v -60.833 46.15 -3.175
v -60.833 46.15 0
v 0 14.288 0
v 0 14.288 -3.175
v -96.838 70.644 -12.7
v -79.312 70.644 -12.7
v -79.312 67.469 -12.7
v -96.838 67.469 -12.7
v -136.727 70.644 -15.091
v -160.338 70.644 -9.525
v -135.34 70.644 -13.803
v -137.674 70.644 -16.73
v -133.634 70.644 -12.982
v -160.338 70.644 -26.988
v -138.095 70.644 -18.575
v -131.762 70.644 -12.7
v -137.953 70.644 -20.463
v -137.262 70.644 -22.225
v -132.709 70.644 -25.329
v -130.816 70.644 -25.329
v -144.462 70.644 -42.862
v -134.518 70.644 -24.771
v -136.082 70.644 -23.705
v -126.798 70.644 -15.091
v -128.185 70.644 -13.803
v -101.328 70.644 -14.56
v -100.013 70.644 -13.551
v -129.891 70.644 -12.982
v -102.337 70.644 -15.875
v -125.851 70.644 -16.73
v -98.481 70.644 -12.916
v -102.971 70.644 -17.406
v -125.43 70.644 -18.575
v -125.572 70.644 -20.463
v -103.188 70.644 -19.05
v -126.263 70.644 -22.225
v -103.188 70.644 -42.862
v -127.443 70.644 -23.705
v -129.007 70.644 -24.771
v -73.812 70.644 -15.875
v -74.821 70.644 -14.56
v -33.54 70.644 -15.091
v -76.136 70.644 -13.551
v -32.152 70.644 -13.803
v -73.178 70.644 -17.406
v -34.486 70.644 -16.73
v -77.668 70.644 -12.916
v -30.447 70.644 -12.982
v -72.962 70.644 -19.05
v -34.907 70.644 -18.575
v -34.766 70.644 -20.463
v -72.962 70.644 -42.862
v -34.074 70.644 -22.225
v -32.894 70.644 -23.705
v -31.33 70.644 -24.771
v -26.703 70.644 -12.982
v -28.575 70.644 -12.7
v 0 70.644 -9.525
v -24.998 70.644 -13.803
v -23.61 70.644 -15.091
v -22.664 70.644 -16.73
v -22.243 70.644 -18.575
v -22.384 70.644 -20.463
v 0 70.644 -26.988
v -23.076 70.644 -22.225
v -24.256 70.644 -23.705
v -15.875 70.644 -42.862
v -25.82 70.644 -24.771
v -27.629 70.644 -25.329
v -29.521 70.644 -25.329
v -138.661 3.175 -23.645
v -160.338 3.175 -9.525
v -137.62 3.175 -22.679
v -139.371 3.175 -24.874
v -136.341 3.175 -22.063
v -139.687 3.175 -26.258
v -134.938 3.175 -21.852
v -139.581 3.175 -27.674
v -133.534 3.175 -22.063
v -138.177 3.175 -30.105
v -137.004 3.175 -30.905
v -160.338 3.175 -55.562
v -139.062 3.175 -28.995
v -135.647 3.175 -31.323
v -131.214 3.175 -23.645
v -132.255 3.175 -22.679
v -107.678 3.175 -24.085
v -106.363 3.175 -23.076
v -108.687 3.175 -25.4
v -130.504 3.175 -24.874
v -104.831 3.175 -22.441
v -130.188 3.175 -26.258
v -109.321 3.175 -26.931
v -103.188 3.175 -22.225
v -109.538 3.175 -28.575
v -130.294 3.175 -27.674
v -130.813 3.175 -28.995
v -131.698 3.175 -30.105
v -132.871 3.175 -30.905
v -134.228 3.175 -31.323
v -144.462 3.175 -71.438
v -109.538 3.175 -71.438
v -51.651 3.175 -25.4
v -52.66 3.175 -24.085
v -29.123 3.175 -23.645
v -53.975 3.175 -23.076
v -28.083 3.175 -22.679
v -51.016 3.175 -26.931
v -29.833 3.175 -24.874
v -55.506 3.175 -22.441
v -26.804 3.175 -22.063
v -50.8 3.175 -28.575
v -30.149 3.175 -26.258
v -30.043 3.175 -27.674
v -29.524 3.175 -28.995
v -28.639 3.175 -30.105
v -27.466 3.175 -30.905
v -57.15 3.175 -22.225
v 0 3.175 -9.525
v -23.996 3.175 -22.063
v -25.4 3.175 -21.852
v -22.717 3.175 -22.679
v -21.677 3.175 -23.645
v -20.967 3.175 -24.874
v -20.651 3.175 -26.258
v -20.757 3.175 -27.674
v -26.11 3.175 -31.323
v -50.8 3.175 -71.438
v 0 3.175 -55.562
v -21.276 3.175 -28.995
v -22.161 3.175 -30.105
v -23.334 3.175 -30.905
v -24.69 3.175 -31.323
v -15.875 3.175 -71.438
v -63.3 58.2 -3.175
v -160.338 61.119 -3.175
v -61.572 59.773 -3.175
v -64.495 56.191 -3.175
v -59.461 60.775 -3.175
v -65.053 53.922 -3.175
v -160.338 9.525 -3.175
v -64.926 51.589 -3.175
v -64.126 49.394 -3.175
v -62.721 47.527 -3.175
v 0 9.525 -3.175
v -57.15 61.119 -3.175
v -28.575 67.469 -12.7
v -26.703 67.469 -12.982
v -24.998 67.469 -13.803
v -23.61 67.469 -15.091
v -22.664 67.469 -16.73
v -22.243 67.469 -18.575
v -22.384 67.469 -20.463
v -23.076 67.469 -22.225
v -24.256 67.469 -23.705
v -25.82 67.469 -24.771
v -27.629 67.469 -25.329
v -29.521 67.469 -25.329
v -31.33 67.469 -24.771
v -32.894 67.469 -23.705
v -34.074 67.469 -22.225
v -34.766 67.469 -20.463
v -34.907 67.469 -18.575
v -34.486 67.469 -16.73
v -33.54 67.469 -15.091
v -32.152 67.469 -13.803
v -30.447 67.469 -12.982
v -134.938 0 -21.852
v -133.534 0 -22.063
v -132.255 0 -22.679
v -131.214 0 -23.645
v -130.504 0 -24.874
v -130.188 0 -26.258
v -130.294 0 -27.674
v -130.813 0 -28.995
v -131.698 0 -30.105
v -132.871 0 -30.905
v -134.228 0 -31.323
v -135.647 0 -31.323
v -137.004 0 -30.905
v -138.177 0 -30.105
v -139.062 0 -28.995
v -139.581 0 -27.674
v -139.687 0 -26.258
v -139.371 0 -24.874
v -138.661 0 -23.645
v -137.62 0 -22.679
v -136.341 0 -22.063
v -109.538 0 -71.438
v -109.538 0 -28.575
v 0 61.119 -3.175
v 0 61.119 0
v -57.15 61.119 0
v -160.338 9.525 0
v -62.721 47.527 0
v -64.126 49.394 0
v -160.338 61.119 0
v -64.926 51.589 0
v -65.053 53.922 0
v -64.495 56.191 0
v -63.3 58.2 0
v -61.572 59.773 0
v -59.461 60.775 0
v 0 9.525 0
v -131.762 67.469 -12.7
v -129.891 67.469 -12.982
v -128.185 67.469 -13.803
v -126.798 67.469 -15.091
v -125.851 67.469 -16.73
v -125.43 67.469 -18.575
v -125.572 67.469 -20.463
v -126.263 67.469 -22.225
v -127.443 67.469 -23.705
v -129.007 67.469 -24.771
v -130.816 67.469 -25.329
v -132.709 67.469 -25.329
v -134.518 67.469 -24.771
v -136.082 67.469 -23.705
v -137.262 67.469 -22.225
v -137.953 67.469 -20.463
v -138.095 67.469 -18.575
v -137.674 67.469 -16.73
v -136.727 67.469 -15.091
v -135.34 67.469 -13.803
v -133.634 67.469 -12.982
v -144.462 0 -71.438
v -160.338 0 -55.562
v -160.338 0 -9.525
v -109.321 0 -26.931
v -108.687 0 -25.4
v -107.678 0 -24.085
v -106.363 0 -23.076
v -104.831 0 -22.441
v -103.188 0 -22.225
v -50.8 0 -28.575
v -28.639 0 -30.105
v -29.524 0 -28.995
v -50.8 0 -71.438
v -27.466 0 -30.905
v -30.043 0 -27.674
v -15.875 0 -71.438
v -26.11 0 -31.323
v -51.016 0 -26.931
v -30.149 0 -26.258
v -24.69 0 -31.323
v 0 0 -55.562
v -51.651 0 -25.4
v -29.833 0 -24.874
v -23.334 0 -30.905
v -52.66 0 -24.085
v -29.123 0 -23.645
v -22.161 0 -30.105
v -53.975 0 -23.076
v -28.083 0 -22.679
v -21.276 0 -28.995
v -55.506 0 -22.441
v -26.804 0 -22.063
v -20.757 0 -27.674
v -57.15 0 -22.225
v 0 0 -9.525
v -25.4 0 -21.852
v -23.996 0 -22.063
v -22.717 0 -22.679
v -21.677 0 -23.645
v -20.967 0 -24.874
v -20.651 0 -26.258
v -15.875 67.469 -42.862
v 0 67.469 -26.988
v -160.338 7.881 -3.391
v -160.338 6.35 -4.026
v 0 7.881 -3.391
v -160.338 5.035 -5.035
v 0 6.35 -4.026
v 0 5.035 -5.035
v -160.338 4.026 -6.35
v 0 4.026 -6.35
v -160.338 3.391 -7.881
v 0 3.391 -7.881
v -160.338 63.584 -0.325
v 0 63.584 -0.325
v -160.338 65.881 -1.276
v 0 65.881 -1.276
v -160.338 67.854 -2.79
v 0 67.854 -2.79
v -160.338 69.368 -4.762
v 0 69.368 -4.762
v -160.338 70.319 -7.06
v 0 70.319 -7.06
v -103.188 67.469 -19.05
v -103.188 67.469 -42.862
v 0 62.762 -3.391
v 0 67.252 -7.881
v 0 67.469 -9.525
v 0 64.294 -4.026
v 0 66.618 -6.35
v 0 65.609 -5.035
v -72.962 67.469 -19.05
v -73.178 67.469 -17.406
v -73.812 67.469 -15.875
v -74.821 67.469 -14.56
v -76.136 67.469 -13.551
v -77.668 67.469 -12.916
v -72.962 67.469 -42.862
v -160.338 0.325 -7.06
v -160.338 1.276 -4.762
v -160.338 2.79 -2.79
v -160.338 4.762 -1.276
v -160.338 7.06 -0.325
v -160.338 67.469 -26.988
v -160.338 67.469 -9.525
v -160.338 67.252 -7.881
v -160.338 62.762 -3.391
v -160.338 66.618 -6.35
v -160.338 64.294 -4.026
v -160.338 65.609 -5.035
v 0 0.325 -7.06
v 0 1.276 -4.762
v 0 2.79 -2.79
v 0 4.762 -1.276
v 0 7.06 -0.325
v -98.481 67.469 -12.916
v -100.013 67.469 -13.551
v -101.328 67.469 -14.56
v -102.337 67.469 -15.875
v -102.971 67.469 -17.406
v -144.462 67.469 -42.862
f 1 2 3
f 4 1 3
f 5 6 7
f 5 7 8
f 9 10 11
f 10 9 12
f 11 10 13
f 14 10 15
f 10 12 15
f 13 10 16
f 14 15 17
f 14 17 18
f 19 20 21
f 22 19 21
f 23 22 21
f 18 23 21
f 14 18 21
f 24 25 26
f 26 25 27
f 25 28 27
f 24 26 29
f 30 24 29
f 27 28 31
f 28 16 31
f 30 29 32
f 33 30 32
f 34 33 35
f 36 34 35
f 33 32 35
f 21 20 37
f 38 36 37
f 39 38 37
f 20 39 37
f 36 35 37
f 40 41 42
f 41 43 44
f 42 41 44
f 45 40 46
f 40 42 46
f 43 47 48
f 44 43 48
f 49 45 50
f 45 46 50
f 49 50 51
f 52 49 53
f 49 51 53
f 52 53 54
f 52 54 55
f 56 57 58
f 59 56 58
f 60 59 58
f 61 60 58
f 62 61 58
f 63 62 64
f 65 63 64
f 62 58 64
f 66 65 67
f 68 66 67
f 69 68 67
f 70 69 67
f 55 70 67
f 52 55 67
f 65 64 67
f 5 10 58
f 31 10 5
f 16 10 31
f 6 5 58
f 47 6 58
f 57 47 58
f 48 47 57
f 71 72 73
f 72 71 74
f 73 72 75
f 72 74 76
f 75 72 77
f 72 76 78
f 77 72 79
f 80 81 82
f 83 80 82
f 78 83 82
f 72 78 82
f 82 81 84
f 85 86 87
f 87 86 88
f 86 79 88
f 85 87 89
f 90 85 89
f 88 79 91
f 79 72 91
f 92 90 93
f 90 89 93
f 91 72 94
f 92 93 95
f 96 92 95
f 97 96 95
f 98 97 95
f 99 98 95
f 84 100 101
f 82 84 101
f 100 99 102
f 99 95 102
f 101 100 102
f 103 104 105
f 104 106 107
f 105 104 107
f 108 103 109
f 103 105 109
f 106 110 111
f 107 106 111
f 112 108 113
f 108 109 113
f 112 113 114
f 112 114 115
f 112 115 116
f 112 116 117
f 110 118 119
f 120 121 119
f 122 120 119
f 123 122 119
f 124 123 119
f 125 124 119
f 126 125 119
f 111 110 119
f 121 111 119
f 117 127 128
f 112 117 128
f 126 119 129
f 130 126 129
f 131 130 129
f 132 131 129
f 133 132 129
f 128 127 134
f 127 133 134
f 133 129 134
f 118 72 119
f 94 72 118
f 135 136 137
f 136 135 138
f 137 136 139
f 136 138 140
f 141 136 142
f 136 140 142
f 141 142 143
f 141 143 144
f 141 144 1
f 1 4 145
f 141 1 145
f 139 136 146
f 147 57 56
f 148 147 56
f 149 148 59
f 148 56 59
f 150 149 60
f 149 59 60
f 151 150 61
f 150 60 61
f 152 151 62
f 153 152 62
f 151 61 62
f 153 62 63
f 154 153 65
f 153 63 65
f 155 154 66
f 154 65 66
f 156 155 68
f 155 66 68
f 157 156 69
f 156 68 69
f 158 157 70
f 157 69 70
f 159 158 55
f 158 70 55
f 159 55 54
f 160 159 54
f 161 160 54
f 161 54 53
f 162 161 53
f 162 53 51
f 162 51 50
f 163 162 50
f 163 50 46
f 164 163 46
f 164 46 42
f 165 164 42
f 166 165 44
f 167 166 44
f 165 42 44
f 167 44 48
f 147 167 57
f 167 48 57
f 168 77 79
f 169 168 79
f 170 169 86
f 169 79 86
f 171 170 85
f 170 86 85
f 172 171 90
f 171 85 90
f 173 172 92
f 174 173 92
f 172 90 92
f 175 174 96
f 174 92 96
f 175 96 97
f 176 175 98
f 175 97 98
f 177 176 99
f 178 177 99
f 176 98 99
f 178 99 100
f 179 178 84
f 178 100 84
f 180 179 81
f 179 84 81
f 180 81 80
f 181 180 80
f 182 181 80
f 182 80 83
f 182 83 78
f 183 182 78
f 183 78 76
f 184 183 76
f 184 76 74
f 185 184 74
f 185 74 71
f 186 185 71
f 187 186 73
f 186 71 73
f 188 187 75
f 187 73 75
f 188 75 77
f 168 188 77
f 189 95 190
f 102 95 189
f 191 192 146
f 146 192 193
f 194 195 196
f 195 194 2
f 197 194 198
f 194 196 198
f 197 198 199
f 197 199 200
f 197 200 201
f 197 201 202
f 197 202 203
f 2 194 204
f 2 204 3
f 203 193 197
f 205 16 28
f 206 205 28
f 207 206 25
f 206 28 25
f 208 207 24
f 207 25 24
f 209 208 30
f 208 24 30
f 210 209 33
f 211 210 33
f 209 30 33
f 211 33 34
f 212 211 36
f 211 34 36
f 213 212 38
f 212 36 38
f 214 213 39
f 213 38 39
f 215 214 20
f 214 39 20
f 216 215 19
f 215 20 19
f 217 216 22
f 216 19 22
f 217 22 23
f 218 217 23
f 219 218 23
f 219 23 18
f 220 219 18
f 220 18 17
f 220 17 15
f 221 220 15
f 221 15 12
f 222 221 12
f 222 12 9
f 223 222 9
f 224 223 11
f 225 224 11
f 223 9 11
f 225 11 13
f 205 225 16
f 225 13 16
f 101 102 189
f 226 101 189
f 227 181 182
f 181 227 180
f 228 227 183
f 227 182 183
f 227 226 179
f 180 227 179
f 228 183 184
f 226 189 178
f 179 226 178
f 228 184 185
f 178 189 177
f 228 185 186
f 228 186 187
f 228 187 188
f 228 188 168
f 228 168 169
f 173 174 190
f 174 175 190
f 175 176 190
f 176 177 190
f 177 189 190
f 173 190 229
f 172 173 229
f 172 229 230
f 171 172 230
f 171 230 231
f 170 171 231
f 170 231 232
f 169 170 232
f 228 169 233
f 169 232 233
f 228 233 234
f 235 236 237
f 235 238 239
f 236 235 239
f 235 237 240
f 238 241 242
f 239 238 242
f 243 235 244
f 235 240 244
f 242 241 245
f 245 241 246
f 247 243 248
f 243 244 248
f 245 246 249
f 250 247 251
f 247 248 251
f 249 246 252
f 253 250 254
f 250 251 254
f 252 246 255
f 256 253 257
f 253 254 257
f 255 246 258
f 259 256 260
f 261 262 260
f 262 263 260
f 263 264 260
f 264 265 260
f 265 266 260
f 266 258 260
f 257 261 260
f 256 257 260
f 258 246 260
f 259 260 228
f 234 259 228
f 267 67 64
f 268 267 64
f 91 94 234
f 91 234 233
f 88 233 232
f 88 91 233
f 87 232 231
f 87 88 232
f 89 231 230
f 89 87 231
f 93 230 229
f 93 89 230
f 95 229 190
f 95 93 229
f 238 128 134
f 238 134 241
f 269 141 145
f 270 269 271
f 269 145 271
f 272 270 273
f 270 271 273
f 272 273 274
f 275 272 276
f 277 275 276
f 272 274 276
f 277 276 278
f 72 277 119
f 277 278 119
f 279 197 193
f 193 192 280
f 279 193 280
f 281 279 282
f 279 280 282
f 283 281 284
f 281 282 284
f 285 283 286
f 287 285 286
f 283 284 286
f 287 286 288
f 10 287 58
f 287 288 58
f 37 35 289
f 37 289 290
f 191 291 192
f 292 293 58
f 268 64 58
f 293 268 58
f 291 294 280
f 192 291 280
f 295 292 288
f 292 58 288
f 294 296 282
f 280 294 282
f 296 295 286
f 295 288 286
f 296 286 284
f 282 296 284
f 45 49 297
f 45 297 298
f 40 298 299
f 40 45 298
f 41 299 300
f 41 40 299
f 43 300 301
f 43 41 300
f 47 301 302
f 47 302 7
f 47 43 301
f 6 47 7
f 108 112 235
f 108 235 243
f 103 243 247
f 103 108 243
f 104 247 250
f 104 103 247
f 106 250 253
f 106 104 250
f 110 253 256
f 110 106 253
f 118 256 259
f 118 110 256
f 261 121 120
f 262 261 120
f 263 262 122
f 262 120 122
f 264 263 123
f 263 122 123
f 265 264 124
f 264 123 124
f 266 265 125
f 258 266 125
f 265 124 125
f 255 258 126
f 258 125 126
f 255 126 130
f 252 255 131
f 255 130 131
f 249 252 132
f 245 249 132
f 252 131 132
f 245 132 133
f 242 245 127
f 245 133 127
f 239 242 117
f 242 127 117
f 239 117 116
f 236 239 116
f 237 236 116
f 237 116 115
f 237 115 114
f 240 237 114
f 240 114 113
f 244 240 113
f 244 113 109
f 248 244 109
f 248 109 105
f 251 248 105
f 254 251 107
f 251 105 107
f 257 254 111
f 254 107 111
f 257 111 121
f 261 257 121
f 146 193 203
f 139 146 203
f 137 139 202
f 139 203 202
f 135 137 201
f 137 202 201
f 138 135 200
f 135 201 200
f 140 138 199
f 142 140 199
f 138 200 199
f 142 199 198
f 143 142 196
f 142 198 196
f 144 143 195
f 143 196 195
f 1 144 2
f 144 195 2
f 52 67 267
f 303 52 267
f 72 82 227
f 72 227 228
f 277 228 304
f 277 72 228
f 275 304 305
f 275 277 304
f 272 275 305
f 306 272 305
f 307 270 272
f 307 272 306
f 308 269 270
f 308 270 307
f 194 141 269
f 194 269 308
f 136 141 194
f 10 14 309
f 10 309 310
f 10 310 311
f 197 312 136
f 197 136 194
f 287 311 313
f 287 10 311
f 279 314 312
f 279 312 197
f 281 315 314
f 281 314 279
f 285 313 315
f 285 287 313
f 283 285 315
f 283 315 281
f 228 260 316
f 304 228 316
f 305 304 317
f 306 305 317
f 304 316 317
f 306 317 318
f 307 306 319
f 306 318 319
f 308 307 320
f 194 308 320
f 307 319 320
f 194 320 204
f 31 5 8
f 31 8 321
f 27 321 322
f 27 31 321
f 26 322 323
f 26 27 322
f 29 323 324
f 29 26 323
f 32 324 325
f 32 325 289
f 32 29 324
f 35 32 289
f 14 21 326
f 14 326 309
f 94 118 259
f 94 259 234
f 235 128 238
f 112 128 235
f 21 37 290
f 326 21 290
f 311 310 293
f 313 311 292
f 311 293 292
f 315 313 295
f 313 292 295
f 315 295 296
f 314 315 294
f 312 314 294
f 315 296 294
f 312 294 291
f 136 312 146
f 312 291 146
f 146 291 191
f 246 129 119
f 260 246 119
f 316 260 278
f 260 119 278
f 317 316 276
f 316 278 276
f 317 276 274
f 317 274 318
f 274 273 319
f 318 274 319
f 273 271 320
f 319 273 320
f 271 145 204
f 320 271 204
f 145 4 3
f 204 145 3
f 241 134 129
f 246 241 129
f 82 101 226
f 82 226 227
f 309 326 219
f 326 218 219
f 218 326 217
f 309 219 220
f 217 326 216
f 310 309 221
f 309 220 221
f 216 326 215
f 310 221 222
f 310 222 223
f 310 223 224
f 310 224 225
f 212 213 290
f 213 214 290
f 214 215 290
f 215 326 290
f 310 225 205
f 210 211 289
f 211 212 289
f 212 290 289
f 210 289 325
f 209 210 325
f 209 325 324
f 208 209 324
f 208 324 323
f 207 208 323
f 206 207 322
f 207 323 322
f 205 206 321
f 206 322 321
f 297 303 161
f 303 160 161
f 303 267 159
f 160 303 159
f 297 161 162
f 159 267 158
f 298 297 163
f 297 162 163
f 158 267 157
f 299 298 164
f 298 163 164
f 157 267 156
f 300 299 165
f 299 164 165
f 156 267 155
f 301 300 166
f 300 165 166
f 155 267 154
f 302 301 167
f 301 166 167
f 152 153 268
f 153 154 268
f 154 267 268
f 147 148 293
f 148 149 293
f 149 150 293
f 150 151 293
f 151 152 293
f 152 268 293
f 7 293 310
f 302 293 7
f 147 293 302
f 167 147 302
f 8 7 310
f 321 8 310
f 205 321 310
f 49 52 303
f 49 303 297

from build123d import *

# Parameters (mm, degrees)
BASE_FLANGE1_DEPTH = 160.3375
CUT_EXTRUDE1_DEPTH = 3.175
CUT_EXTRUDE2_DEPTH = 3.175
CUT_EXTRUDE3_DEPTH = 3.175
CUT_EXTRUDE4_DEPTH = 3.175
CUT_EXTRUDE5_DEPTH = 3.175
CUT_EXTRUDE6_DEPTH = 3.175
SKETCH12_R         = 6.35
CUT_EXTRUDE7_DEPTH = 3.175
SKETCH13_R         = 4.7625
CUT_EXTRUDE8_DEPTH = 3.175
CUT_EXTRUDE9_DEPTH = 3.175


# Sheet-metal steps are written as plain solids
with BuildPart() as part:
    # Sketch1 → Base-Flange1 (new body)
    with BuildSketch(Plane(origin=(0, 0, 0), x_dir=(0, 0, -1), z_dir=(1, 0, 0))):
        with BuildLine():
            Line((71.4375, 0), (9.525, 0))
            ThreePointArc((9.525, 0), (2.789807909, 2.789807909), (0, 9.525))
            Line((0, 9.525), (0, 61.11875))
            ThreePointArc((0, 61.11875), (2.789807909, 67.853942091), (9.525, 70.64375))
            Line((9.525, 70.64375), (42.8625, 70.64375))
            Line((42.8625, 70.64375), (42.8625, 67.46875))
            Line((42.8625, 67.46875), (9.525, 67.46875))
            ThreePointArc((9.525, 67.46875), (5.034871939, 65.608878061), (3.175, 61.11875))
            Line((3.175, 61.11875), (3.175, 9.525))
            ThreePointArc((3.175, 9.525), (5.034871939, 5.034871939), (9.525, 3.175))
            Line((9.525, 3.175), (71.4375, 3.175))
            Line((71.4375, 3.175), (71.4375, 0))
        make_face()
    extrude(amount=-BASE_FLANGE1_DEPTH)

    # Sketch6 → Cut-Extrude1 (cut)
    with BuildSketch(Plane(origin=(0, 3.175, 0), x_dir=(1, 0, 0), z_dir=(0, 1, 0))):
        with BuildLine():
            Line((-50.8, 71.4375), (-50.8, 28.575))
            ThreePointArc((-50.8, 28.575), (-52.659871939, 24.084871939), (-57.15, 22.225))
            Line((-57.15, 22.225), (-103.1875, 22.225))
            ThreePointArc((-103.1875, 22.225), (-107.677628061, 24.084871939), (-109.5375, 28.575))
            Line((-109.5375, 28.575), (-109.5375, 71.4375))
            Line((-109.5375, 71.4375), (-50.8, 71.4375))
        make_face()
    extrude(amount=-CUT_EXTRUDE1_DEPTH, mode=Mode.SUBTRACT)

    # Sketch7 → Cut-Extrude2 (cut)
    with BuildSketch(Plane(origin=(0, 3.175, 0), x_dir=(1, 0, 0), z_dir=(0, 1, 0))):
        Polygon((0, 71.4375), (-15.875, 71.4375), (0, 55.5625), align=None)
    extrude(amount=-CUT_EXTRUDE2_DEPTH, mode=Mode.SUBTRACT)

    # Sketch8 → Cut-Extrude3 (cut)
    with BuildSketch(Plane(origin=(0, 3.175, 0), x_dir=(1, 0, 0), z_dir=(0, 1, 0))):
        Polygon((-160.3375, 71.4375), (-144.4625, 71.4375), (-160.3375, 55.5625), align=None)
    extrude(amount=-CUT_EXTRUDE3_DEPTH, mode=Mode.SUBTRACT)

    # Sketch9 → Cut-Extrude4 (cut)
    with BuildSketch(Plane(origin=(0, 70.64375, 0), x_dir=(1, 0, 0), z_dir=(0, 1, 0))):
        Polygon((-160.3375, 42.8625), (-144.4625, 42.8625), (-160.3375, 26.9875), align=None)
    extrude(amount=-CUT_EXTRUDE4_DEPTH, mode=Mode.SUBTRACT)

    # Sketch10 → Cut-Extrude5 (cut)
    with BuildSketch(Plane(origin=(0, 70.64375, 0), x_dir=(1, 0, 0), z_dir=(0, 1, 0))):
        Polygon((0, 42.8625), (-15.875, 42.8625), (0, 26.9875), align=None)
    extrude(amount=-CUT_EXTRUDE5_DEPTH, mode=Mode.SUBTRACT)

    # Sketch11 → Cut-Extrude6 (cut)
    with BuildSketch(Plane.XY):
        with BuildLine():
            Line((0, 61.11875), (-57.15, 61.11875))
            ThreePointArc((-57.15, 61.11875), (-64.857648322, 55.07757898), (-60.83283134, 46.149844766))
            Line((-60.83283134, 46.149844766), (0, 14.2875))
            Line((0, 14.2875), (0, 61.11875))
        make_face()
    extrude(amount=-CUT_EXTRUDE6_DEPTH, mode=Mode.SUBTRACT)

    # Sketch12 → Cut-Extrude7 (cut)
    with BuildSketch(Plane(origin=(0, 70.64375, 0), x_dir=(1, 0, 0), z_dir=(0, 1, 0))):
        with Locations(Location((-28.575, 19.05, 0), (0, 0, 270))):
            Circle(SKETCH12_R)
        with Locations(Location((-131.7625, 19.05, 0), (0, 0, 270))):
            Circle(SKETCH12_R)
    extrude(amount=-CUT_EXTRUDE7_DEPTH, mode=Mode.SUBTRACT)

    # Sketch13 → Cut-Extrude8 (cut)
    with BuildSketch(Plane(origin=(0, 3.175, 0), x_dir=(1, 0, 0), z_dir=(0, 1, 0))):
        with Locations(Location((-25.4, 26.614015176, 0), (0, 0, 270))):
            Circle(SKETCH13_R)
        with Locations(Location((-134.9375, 26.614015176, 0), (0, 0, 270))):
            Circle(SKETCH13_R)
    extrude(amount=-CUT_EXTRUDE8_DEPTH, mode=Mode.SUBTRACT)

    # Sketch14 → Cut-Extrude9 (cut)
    with BuildSketch(Plane(origin=(0, 70.64375, 0), x_dir=(1, 0, 0), z_dir=(0, 1, 0))):
        with BuildLine():
            Line((-72.9615, 42.8625), (-72.9615, 19.05))
            ThreePointArc((-72.9615, 19.05), (-74.821371939, 14.559871939), (-79.3115, 12.7))
            Line((-79.3115, 12.7), (-96.8375, 12.7))
            ThreePointArc((-96.8375, 12.7), (-101.327628061, 14.559871939), (-103.1875, 19.05))
            Line((-103.1875, 19.05), (-103.1875, 42.8625))
            Line((-103.1875, 42.8625), (-72.9615, 42.8625))
        make_face()
    extrude(amount=-CUT_EXTRUDE9_DEPTH, mode=Mode.SUBTRACT)


solid = part.part
